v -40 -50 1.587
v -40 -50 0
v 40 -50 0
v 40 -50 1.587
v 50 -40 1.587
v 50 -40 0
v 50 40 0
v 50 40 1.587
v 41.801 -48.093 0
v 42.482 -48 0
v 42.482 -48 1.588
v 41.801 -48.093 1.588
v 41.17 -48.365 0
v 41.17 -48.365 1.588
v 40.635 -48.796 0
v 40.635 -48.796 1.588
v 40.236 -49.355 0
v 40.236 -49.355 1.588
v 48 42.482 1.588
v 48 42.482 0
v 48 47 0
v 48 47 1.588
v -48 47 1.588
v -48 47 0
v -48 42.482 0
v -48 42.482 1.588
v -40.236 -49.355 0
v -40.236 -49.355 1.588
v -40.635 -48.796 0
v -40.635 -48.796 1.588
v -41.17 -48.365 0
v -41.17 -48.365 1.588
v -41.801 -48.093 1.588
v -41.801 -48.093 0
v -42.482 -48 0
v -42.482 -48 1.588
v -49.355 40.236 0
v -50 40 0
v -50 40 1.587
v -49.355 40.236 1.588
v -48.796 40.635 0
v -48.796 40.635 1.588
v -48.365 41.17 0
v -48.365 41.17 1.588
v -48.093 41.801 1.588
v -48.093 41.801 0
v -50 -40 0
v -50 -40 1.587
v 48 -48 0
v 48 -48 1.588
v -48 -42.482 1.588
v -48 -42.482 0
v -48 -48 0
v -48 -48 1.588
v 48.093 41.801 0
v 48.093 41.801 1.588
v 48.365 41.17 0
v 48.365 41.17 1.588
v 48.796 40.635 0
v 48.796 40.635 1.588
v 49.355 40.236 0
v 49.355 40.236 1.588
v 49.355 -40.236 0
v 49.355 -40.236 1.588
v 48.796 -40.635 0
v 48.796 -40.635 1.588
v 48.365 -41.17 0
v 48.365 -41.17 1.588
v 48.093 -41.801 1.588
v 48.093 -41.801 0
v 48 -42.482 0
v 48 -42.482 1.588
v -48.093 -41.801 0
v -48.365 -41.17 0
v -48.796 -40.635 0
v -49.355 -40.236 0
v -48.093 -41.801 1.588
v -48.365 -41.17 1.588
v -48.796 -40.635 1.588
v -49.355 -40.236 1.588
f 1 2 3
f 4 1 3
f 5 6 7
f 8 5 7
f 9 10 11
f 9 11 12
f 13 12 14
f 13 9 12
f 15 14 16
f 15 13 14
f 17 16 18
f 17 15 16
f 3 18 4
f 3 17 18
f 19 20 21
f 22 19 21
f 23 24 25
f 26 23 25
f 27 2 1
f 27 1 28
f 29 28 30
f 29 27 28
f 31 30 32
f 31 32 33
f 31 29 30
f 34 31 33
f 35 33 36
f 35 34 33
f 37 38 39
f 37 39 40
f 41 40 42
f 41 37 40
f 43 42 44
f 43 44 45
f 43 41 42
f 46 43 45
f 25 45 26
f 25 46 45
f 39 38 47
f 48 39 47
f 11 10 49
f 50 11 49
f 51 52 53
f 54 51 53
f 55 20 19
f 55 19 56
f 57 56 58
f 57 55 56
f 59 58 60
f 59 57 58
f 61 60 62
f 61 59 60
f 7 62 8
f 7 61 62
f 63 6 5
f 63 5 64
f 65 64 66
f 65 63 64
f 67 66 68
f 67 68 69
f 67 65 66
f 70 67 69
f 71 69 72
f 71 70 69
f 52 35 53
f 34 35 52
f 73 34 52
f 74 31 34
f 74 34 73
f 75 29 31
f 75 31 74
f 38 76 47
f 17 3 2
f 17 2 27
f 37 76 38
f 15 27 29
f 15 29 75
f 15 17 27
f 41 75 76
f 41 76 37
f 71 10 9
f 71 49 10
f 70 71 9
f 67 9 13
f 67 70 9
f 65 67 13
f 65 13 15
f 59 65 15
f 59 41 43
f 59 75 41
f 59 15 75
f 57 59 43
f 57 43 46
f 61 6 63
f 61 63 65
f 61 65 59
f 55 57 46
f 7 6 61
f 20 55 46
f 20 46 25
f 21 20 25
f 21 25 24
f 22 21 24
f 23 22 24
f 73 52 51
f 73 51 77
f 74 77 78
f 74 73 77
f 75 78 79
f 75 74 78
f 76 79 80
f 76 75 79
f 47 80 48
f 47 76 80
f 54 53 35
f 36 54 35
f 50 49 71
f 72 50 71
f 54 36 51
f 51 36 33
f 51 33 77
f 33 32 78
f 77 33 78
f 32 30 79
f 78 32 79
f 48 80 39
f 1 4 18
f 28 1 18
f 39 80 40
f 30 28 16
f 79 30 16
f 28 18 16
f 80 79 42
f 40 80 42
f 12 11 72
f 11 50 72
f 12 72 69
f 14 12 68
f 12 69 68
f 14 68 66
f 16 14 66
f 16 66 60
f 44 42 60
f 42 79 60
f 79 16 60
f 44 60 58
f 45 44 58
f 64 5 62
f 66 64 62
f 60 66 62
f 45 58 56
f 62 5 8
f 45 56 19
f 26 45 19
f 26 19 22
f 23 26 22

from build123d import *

# Parameters (mm, degrees)
BOSS_EXTRUDE1_DEPTH = 1.5875
FILLET1_R           = 2.54


with BuildPart() as part:
    # Sketch1 → Boss-Extrude1 (new body)
    with BuildSketch(Plane.XY):
        Polygon((-40, -48), (-40, -50), (-37.864895224, -50), (40, -50), (40, -48), (48, -48), (48, -40), (50, -40), (50, 40), (48, 40), (48, 47), (-48, 47), (-48, 40), (-50, 40), (-50, -37.864895224), (-50, -40), (-48, -40), (-48, -48), align=None)
    extrude(amount=BOSS_EXTRUDE1_DEPTH)

    # Fillet1
    # the kernel refuses this fillet: 2.54 mm, written as the material it adds along each edge
    with BuildSketch(Plane(origin=(-48, -40, 0), x_dir=(0, -1, 0), z_dir=(0, 0, 1)), Plane(origin=(48, 40, 0), x_dir=(0, 1, 0), z_dir=(0, 0, 1))) as fillet1_piece_1:
        with BuildLine():
            CenterArc((2.481934729, -2.54), FILLET1_R, 90, 77.725329785)
            Line((0, -2), (-0.049638695, -1.9892))
            ThreePointArc((-0.049638695, -1.9892), (-0.0508, -1), (-0.0508, 0))
            Line((-0.0508, 0), (0, 0.0508))
            Line((0, 0.0508), (2.481934729, 0.0508))
            Line((2.481934729, 0.0508), (2.481934729, 0))
        make_face()
    extrude(amount=1.5875)
    with BuildSketch(Plane(origin=(-40, -48, 0), x_dir=(-3.737454790095179e-12, -1.0, 0), z_dir=(0, 0, 1)), Plane(origin=(48, -40, 0), x_dir=(1.0, -3.7339020764163554e-12, 0), z_dir=(0, 0, 1)), Plane(origin=(-48, 40, 0), x_dir=(-1.0, 3.790745495277064e-12, 0), z_dir=(0, 0, 1))) as fillet1_piece_2:
        with BuildLine():
            CenterArc((2.54, -2.481934729), FILLET1_R, 102.274670215, 77.725329785)
            Line((0, -2.481934729), (-0.0508, -2.481934729))
            Line((-0.0508, -2.481934729), (-0.0508, 0))
            Line((-0.0508, 0), (0, 0.0508))
            ThreePointArc((0, 0.0508), (1, 0.0508), (1.9892, 0.049638695))
            Line((1.9892, 0.049638695), (2, 0))
        make_face()
    extrude(amount=1.5875)
    with BuildSketch(Plane(origin=(40, -48, 0), x_dir=(3.808509063671012e-12, -1.0, 0), z_dir=(0, 0, 1))) as fillet1_piece_3:
        with BuildLine():
            CenterArc((2.54, 2.481934729), FILLET1_R, 180, 77.725329785)
            Line((0, 2.481934729), (-0.0508, 2.481934729))
            Line((-0.0508, 2.481934729), (-0.0508, 0))
            Line((-0.0508, 0), (0, -0.0508))
            ThreePointArc((0, -0.0508), (1, -0.0508), (1.9892, -0.049638695))
            Line((1.9892, -0.049638695), (2, 0))
        make_face()
    extrude(amount=1.5875)


solid = part.part
